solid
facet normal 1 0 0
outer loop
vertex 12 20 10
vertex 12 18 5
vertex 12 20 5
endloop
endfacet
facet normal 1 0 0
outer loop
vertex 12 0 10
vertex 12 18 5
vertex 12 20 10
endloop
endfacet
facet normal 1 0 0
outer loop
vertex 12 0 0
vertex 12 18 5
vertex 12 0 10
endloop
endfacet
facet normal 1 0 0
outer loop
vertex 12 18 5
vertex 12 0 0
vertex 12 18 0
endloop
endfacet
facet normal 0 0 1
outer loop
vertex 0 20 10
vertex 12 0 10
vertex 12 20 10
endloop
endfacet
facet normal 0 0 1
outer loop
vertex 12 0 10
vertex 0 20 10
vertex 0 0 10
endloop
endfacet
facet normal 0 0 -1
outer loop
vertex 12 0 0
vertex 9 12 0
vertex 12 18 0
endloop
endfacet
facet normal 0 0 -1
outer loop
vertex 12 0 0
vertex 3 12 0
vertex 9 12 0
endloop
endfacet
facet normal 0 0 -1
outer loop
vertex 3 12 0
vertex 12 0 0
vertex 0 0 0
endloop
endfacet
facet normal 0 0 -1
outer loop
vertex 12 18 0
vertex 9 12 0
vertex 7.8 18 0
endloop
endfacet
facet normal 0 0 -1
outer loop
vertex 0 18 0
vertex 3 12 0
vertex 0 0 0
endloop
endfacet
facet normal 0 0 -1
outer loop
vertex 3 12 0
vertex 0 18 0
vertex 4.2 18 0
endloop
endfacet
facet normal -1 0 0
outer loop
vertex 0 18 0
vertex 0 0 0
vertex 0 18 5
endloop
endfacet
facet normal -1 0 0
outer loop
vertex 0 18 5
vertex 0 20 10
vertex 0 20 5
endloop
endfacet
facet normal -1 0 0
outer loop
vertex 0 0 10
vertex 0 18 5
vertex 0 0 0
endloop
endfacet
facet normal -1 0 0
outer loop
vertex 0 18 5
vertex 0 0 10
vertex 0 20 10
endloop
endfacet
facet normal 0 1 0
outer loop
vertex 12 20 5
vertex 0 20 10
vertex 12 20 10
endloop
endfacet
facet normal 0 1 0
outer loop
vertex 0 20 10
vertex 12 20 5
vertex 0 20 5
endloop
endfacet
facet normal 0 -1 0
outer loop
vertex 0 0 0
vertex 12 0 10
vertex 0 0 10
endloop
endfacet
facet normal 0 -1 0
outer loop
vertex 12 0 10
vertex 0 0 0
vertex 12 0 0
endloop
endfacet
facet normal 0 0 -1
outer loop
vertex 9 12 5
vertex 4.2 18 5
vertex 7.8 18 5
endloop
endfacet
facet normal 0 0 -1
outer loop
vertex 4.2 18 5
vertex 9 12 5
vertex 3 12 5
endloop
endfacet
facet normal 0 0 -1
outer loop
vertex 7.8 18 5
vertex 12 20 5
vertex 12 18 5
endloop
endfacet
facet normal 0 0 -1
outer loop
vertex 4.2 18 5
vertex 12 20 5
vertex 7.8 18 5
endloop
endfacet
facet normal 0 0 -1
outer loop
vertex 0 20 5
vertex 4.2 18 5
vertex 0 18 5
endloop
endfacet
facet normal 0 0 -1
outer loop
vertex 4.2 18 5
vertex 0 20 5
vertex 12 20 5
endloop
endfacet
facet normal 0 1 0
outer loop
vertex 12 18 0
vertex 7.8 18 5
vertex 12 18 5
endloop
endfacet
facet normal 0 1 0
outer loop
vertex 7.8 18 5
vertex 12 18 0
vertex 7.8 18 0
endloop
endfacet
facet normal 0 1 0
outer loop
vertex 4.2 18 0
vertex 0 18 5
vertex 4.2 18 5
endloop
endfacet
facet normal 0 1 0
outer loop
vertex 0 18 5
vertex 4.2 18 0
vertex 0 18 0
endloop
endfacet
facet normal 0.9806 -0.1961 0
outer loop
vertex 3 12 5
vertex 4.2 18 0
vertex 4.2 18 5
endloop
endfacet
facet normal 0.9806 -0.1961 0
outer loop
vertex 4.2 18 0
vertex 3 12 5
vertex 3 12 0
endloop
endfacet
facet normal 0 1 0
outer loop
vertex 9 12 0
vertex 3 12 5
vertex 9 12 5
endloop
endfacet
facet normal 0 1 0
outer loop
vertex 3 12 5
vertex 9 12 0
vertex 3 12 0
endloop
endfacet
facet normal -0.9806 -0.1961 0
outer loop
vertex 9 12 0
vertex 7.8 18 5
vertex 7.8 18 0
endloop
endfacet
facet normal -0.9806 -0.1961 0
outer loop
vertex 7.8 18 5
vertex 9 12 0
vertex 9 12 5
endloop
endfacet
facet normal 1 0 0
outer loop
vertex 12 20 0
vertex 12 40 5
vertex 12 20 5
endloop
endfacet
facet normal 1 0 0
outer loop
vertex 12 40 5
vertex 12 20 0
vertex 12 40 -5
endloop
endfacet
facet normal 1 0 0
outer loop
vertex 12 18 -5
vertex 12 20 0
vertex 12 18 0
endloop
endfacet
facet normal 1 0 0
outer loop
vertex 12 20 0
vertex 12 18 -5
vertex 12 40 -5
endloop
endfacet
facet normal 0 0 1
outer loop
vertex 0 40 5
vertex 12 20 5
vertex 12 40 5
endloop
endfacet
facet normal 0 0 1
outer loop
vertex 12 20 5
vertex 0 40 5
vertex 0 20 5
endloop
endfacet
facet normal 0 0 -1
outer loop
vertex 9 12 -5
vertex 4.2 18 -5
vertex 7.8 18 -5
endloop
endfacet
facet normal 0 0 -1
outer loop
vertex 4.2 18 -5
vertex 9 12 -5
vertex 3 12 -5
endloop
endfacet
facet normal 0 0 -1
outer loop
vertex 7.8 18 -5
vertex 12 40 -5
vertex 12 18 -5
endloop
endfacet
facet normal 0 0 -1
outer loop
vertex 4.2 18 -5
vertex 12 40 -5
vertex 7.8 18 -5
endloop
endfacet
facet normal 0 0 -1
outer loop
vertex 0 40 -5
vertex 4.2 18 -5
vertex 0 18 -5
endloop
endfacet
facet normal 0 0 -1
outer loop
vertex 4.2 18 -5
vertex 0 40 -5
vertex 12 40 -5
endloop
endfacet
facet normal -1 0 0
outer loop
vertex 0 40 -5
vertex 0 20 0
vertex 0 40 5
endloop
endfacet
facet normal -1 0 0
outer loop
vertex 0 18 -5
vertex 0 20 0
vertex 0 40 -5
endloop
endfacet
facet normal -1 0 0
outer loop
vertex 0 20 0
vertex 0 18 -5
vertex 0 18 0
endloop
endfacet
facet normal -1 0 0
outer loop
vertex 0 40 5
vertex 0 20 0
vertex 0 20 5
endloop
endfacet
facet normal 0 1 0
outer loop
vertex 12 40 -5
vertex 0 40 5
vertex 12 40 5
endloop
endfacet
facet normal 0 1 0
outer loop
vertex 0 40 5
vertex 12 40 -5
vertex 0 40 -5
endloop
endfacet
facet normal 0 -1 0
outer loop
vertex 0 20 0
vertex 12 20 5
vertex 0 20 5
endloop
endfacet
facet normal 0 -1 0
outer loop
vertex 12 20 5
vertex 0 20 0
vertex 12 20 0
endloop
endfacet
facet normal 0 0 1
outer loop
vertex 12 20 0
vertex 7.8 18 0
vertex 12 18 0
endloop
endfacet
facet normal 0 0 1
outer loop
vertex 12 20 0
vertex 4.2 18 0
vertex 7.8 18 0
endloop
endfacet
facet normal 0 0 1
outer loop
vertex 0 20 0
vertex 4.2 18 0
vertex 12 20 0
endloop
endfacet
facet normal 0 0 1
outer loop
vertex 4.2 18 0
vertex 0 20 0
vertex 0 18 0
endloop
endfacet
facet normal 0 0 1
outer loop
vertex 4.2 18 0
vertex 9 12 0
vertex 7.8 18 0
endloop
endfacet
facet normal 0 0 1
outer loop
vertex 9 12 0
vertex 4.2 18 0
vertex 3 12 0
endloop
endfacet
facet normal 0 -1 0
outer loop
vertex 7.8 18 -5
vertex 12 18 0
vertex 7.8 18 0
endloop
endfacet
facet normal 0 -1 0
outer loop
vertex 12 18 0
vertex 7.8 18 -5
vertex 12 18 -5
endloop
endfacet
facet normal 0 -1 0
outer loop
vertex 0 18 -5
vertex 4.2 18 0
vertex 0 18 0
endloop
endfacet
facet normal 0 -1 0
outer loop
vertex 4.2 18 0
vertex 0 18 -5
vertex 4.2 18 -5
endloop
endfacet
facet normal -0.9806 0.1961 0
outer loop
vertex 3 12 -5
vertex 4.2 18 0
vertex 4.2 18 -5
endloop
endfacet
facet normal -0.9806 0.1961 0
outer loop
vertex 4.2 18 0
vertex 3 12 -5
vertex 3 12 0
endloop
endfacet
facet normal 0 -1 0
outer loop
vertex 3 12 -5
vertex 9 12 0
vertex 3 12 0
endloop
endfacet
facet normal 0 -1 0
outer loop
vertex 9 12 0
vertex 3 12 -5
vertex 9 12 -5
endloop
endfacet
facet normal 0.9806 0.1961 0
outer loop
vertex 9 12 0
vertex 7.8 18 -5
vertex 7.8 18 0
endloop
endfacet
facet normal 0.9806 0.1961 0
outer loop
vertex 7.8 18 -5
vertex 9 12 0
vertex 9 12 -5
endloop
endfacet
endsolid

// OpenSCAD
demo();

module demo() {
    size = [12, 20, 10];
    
    color([0.8, 0.5, 0.5])
        stepped_dovetail_splice_female(size, dpct = 0.4);

    color([0.6, 0.25, 0.25])
    translate([0, 20, sin($t * 360) * -5 - 5])
        stepped_dovetail_splice_male(size, dpct = 0.4);
}

module create_dovetail(size, jpct = 0.9, opct = 0.3, ipct = 0.5, dpct = 0.4, spct = 0.5)
{
    function x(t) = lookup(t, [[-1, -size[0]], [0, 0], [1, size[0]]]);
    function y(t) = lookup(t, [[-1, -size[1]], [0, 0], [1, size[1]]]);
    
    linear_extrude(height = size[2] * (1 - spct), $convexity = 10)
        polygon([
            [x(0), y(0)],
            [x(0), y(jpct - 1)],
            
            [x((1 - opct) / 2), y(jpct - 1)],
    
            [x((1 - ipct) / 2), y(-dpct)],
            [x(1 - ((1 - ipct) / 2)), y(-dpct)],
    
            [x(1 - ((1 - opct) / 2)), y(jpct - 1)],
    
            [x(1), y(jpct - 1)],
            [x(1), y(0)],
        ]);
}

//Create the female half of a stepped dovetail splice
// size - A vector3 defining the size
// jpct - Joint Percentage (amount of y axis space which is joint)
// opct - Outer percentage (width of the outer part of the splice)
// ipct - Inner percentage (width of the inner part of the splice, must be > opct)
// dpct - Depth Percentage (depth of joint)
// spct - Step percentage (height of the step part)
module stepped_dovetail_splice_female(size, jpct = 0.9, opct = 0.3, ipct = 0.5, dpct = 0.4, spct = 0.5)
{
    render()
    difference() {
        cube(size);
        translate([0, size[1], -size[2] / 2])
        scale([1, 1, 2])
            create_dovetail(size, jpct, opct, ipct, dpct, spct);
    }
}

//Create the male half of a stepped dovetail splice
// Use the same parameters as the female half to create a matching male
module stepped_dovetail_splice_male(size, jpct = 0.9, opct = 0.3, ipct = 0.5, dpct = 0.4, spct = 0.5)
{
    render()
    union() {
        cube(size);
        create_dovetail(size, jpct, opct, ipct, dpct, spct);
    }
}
